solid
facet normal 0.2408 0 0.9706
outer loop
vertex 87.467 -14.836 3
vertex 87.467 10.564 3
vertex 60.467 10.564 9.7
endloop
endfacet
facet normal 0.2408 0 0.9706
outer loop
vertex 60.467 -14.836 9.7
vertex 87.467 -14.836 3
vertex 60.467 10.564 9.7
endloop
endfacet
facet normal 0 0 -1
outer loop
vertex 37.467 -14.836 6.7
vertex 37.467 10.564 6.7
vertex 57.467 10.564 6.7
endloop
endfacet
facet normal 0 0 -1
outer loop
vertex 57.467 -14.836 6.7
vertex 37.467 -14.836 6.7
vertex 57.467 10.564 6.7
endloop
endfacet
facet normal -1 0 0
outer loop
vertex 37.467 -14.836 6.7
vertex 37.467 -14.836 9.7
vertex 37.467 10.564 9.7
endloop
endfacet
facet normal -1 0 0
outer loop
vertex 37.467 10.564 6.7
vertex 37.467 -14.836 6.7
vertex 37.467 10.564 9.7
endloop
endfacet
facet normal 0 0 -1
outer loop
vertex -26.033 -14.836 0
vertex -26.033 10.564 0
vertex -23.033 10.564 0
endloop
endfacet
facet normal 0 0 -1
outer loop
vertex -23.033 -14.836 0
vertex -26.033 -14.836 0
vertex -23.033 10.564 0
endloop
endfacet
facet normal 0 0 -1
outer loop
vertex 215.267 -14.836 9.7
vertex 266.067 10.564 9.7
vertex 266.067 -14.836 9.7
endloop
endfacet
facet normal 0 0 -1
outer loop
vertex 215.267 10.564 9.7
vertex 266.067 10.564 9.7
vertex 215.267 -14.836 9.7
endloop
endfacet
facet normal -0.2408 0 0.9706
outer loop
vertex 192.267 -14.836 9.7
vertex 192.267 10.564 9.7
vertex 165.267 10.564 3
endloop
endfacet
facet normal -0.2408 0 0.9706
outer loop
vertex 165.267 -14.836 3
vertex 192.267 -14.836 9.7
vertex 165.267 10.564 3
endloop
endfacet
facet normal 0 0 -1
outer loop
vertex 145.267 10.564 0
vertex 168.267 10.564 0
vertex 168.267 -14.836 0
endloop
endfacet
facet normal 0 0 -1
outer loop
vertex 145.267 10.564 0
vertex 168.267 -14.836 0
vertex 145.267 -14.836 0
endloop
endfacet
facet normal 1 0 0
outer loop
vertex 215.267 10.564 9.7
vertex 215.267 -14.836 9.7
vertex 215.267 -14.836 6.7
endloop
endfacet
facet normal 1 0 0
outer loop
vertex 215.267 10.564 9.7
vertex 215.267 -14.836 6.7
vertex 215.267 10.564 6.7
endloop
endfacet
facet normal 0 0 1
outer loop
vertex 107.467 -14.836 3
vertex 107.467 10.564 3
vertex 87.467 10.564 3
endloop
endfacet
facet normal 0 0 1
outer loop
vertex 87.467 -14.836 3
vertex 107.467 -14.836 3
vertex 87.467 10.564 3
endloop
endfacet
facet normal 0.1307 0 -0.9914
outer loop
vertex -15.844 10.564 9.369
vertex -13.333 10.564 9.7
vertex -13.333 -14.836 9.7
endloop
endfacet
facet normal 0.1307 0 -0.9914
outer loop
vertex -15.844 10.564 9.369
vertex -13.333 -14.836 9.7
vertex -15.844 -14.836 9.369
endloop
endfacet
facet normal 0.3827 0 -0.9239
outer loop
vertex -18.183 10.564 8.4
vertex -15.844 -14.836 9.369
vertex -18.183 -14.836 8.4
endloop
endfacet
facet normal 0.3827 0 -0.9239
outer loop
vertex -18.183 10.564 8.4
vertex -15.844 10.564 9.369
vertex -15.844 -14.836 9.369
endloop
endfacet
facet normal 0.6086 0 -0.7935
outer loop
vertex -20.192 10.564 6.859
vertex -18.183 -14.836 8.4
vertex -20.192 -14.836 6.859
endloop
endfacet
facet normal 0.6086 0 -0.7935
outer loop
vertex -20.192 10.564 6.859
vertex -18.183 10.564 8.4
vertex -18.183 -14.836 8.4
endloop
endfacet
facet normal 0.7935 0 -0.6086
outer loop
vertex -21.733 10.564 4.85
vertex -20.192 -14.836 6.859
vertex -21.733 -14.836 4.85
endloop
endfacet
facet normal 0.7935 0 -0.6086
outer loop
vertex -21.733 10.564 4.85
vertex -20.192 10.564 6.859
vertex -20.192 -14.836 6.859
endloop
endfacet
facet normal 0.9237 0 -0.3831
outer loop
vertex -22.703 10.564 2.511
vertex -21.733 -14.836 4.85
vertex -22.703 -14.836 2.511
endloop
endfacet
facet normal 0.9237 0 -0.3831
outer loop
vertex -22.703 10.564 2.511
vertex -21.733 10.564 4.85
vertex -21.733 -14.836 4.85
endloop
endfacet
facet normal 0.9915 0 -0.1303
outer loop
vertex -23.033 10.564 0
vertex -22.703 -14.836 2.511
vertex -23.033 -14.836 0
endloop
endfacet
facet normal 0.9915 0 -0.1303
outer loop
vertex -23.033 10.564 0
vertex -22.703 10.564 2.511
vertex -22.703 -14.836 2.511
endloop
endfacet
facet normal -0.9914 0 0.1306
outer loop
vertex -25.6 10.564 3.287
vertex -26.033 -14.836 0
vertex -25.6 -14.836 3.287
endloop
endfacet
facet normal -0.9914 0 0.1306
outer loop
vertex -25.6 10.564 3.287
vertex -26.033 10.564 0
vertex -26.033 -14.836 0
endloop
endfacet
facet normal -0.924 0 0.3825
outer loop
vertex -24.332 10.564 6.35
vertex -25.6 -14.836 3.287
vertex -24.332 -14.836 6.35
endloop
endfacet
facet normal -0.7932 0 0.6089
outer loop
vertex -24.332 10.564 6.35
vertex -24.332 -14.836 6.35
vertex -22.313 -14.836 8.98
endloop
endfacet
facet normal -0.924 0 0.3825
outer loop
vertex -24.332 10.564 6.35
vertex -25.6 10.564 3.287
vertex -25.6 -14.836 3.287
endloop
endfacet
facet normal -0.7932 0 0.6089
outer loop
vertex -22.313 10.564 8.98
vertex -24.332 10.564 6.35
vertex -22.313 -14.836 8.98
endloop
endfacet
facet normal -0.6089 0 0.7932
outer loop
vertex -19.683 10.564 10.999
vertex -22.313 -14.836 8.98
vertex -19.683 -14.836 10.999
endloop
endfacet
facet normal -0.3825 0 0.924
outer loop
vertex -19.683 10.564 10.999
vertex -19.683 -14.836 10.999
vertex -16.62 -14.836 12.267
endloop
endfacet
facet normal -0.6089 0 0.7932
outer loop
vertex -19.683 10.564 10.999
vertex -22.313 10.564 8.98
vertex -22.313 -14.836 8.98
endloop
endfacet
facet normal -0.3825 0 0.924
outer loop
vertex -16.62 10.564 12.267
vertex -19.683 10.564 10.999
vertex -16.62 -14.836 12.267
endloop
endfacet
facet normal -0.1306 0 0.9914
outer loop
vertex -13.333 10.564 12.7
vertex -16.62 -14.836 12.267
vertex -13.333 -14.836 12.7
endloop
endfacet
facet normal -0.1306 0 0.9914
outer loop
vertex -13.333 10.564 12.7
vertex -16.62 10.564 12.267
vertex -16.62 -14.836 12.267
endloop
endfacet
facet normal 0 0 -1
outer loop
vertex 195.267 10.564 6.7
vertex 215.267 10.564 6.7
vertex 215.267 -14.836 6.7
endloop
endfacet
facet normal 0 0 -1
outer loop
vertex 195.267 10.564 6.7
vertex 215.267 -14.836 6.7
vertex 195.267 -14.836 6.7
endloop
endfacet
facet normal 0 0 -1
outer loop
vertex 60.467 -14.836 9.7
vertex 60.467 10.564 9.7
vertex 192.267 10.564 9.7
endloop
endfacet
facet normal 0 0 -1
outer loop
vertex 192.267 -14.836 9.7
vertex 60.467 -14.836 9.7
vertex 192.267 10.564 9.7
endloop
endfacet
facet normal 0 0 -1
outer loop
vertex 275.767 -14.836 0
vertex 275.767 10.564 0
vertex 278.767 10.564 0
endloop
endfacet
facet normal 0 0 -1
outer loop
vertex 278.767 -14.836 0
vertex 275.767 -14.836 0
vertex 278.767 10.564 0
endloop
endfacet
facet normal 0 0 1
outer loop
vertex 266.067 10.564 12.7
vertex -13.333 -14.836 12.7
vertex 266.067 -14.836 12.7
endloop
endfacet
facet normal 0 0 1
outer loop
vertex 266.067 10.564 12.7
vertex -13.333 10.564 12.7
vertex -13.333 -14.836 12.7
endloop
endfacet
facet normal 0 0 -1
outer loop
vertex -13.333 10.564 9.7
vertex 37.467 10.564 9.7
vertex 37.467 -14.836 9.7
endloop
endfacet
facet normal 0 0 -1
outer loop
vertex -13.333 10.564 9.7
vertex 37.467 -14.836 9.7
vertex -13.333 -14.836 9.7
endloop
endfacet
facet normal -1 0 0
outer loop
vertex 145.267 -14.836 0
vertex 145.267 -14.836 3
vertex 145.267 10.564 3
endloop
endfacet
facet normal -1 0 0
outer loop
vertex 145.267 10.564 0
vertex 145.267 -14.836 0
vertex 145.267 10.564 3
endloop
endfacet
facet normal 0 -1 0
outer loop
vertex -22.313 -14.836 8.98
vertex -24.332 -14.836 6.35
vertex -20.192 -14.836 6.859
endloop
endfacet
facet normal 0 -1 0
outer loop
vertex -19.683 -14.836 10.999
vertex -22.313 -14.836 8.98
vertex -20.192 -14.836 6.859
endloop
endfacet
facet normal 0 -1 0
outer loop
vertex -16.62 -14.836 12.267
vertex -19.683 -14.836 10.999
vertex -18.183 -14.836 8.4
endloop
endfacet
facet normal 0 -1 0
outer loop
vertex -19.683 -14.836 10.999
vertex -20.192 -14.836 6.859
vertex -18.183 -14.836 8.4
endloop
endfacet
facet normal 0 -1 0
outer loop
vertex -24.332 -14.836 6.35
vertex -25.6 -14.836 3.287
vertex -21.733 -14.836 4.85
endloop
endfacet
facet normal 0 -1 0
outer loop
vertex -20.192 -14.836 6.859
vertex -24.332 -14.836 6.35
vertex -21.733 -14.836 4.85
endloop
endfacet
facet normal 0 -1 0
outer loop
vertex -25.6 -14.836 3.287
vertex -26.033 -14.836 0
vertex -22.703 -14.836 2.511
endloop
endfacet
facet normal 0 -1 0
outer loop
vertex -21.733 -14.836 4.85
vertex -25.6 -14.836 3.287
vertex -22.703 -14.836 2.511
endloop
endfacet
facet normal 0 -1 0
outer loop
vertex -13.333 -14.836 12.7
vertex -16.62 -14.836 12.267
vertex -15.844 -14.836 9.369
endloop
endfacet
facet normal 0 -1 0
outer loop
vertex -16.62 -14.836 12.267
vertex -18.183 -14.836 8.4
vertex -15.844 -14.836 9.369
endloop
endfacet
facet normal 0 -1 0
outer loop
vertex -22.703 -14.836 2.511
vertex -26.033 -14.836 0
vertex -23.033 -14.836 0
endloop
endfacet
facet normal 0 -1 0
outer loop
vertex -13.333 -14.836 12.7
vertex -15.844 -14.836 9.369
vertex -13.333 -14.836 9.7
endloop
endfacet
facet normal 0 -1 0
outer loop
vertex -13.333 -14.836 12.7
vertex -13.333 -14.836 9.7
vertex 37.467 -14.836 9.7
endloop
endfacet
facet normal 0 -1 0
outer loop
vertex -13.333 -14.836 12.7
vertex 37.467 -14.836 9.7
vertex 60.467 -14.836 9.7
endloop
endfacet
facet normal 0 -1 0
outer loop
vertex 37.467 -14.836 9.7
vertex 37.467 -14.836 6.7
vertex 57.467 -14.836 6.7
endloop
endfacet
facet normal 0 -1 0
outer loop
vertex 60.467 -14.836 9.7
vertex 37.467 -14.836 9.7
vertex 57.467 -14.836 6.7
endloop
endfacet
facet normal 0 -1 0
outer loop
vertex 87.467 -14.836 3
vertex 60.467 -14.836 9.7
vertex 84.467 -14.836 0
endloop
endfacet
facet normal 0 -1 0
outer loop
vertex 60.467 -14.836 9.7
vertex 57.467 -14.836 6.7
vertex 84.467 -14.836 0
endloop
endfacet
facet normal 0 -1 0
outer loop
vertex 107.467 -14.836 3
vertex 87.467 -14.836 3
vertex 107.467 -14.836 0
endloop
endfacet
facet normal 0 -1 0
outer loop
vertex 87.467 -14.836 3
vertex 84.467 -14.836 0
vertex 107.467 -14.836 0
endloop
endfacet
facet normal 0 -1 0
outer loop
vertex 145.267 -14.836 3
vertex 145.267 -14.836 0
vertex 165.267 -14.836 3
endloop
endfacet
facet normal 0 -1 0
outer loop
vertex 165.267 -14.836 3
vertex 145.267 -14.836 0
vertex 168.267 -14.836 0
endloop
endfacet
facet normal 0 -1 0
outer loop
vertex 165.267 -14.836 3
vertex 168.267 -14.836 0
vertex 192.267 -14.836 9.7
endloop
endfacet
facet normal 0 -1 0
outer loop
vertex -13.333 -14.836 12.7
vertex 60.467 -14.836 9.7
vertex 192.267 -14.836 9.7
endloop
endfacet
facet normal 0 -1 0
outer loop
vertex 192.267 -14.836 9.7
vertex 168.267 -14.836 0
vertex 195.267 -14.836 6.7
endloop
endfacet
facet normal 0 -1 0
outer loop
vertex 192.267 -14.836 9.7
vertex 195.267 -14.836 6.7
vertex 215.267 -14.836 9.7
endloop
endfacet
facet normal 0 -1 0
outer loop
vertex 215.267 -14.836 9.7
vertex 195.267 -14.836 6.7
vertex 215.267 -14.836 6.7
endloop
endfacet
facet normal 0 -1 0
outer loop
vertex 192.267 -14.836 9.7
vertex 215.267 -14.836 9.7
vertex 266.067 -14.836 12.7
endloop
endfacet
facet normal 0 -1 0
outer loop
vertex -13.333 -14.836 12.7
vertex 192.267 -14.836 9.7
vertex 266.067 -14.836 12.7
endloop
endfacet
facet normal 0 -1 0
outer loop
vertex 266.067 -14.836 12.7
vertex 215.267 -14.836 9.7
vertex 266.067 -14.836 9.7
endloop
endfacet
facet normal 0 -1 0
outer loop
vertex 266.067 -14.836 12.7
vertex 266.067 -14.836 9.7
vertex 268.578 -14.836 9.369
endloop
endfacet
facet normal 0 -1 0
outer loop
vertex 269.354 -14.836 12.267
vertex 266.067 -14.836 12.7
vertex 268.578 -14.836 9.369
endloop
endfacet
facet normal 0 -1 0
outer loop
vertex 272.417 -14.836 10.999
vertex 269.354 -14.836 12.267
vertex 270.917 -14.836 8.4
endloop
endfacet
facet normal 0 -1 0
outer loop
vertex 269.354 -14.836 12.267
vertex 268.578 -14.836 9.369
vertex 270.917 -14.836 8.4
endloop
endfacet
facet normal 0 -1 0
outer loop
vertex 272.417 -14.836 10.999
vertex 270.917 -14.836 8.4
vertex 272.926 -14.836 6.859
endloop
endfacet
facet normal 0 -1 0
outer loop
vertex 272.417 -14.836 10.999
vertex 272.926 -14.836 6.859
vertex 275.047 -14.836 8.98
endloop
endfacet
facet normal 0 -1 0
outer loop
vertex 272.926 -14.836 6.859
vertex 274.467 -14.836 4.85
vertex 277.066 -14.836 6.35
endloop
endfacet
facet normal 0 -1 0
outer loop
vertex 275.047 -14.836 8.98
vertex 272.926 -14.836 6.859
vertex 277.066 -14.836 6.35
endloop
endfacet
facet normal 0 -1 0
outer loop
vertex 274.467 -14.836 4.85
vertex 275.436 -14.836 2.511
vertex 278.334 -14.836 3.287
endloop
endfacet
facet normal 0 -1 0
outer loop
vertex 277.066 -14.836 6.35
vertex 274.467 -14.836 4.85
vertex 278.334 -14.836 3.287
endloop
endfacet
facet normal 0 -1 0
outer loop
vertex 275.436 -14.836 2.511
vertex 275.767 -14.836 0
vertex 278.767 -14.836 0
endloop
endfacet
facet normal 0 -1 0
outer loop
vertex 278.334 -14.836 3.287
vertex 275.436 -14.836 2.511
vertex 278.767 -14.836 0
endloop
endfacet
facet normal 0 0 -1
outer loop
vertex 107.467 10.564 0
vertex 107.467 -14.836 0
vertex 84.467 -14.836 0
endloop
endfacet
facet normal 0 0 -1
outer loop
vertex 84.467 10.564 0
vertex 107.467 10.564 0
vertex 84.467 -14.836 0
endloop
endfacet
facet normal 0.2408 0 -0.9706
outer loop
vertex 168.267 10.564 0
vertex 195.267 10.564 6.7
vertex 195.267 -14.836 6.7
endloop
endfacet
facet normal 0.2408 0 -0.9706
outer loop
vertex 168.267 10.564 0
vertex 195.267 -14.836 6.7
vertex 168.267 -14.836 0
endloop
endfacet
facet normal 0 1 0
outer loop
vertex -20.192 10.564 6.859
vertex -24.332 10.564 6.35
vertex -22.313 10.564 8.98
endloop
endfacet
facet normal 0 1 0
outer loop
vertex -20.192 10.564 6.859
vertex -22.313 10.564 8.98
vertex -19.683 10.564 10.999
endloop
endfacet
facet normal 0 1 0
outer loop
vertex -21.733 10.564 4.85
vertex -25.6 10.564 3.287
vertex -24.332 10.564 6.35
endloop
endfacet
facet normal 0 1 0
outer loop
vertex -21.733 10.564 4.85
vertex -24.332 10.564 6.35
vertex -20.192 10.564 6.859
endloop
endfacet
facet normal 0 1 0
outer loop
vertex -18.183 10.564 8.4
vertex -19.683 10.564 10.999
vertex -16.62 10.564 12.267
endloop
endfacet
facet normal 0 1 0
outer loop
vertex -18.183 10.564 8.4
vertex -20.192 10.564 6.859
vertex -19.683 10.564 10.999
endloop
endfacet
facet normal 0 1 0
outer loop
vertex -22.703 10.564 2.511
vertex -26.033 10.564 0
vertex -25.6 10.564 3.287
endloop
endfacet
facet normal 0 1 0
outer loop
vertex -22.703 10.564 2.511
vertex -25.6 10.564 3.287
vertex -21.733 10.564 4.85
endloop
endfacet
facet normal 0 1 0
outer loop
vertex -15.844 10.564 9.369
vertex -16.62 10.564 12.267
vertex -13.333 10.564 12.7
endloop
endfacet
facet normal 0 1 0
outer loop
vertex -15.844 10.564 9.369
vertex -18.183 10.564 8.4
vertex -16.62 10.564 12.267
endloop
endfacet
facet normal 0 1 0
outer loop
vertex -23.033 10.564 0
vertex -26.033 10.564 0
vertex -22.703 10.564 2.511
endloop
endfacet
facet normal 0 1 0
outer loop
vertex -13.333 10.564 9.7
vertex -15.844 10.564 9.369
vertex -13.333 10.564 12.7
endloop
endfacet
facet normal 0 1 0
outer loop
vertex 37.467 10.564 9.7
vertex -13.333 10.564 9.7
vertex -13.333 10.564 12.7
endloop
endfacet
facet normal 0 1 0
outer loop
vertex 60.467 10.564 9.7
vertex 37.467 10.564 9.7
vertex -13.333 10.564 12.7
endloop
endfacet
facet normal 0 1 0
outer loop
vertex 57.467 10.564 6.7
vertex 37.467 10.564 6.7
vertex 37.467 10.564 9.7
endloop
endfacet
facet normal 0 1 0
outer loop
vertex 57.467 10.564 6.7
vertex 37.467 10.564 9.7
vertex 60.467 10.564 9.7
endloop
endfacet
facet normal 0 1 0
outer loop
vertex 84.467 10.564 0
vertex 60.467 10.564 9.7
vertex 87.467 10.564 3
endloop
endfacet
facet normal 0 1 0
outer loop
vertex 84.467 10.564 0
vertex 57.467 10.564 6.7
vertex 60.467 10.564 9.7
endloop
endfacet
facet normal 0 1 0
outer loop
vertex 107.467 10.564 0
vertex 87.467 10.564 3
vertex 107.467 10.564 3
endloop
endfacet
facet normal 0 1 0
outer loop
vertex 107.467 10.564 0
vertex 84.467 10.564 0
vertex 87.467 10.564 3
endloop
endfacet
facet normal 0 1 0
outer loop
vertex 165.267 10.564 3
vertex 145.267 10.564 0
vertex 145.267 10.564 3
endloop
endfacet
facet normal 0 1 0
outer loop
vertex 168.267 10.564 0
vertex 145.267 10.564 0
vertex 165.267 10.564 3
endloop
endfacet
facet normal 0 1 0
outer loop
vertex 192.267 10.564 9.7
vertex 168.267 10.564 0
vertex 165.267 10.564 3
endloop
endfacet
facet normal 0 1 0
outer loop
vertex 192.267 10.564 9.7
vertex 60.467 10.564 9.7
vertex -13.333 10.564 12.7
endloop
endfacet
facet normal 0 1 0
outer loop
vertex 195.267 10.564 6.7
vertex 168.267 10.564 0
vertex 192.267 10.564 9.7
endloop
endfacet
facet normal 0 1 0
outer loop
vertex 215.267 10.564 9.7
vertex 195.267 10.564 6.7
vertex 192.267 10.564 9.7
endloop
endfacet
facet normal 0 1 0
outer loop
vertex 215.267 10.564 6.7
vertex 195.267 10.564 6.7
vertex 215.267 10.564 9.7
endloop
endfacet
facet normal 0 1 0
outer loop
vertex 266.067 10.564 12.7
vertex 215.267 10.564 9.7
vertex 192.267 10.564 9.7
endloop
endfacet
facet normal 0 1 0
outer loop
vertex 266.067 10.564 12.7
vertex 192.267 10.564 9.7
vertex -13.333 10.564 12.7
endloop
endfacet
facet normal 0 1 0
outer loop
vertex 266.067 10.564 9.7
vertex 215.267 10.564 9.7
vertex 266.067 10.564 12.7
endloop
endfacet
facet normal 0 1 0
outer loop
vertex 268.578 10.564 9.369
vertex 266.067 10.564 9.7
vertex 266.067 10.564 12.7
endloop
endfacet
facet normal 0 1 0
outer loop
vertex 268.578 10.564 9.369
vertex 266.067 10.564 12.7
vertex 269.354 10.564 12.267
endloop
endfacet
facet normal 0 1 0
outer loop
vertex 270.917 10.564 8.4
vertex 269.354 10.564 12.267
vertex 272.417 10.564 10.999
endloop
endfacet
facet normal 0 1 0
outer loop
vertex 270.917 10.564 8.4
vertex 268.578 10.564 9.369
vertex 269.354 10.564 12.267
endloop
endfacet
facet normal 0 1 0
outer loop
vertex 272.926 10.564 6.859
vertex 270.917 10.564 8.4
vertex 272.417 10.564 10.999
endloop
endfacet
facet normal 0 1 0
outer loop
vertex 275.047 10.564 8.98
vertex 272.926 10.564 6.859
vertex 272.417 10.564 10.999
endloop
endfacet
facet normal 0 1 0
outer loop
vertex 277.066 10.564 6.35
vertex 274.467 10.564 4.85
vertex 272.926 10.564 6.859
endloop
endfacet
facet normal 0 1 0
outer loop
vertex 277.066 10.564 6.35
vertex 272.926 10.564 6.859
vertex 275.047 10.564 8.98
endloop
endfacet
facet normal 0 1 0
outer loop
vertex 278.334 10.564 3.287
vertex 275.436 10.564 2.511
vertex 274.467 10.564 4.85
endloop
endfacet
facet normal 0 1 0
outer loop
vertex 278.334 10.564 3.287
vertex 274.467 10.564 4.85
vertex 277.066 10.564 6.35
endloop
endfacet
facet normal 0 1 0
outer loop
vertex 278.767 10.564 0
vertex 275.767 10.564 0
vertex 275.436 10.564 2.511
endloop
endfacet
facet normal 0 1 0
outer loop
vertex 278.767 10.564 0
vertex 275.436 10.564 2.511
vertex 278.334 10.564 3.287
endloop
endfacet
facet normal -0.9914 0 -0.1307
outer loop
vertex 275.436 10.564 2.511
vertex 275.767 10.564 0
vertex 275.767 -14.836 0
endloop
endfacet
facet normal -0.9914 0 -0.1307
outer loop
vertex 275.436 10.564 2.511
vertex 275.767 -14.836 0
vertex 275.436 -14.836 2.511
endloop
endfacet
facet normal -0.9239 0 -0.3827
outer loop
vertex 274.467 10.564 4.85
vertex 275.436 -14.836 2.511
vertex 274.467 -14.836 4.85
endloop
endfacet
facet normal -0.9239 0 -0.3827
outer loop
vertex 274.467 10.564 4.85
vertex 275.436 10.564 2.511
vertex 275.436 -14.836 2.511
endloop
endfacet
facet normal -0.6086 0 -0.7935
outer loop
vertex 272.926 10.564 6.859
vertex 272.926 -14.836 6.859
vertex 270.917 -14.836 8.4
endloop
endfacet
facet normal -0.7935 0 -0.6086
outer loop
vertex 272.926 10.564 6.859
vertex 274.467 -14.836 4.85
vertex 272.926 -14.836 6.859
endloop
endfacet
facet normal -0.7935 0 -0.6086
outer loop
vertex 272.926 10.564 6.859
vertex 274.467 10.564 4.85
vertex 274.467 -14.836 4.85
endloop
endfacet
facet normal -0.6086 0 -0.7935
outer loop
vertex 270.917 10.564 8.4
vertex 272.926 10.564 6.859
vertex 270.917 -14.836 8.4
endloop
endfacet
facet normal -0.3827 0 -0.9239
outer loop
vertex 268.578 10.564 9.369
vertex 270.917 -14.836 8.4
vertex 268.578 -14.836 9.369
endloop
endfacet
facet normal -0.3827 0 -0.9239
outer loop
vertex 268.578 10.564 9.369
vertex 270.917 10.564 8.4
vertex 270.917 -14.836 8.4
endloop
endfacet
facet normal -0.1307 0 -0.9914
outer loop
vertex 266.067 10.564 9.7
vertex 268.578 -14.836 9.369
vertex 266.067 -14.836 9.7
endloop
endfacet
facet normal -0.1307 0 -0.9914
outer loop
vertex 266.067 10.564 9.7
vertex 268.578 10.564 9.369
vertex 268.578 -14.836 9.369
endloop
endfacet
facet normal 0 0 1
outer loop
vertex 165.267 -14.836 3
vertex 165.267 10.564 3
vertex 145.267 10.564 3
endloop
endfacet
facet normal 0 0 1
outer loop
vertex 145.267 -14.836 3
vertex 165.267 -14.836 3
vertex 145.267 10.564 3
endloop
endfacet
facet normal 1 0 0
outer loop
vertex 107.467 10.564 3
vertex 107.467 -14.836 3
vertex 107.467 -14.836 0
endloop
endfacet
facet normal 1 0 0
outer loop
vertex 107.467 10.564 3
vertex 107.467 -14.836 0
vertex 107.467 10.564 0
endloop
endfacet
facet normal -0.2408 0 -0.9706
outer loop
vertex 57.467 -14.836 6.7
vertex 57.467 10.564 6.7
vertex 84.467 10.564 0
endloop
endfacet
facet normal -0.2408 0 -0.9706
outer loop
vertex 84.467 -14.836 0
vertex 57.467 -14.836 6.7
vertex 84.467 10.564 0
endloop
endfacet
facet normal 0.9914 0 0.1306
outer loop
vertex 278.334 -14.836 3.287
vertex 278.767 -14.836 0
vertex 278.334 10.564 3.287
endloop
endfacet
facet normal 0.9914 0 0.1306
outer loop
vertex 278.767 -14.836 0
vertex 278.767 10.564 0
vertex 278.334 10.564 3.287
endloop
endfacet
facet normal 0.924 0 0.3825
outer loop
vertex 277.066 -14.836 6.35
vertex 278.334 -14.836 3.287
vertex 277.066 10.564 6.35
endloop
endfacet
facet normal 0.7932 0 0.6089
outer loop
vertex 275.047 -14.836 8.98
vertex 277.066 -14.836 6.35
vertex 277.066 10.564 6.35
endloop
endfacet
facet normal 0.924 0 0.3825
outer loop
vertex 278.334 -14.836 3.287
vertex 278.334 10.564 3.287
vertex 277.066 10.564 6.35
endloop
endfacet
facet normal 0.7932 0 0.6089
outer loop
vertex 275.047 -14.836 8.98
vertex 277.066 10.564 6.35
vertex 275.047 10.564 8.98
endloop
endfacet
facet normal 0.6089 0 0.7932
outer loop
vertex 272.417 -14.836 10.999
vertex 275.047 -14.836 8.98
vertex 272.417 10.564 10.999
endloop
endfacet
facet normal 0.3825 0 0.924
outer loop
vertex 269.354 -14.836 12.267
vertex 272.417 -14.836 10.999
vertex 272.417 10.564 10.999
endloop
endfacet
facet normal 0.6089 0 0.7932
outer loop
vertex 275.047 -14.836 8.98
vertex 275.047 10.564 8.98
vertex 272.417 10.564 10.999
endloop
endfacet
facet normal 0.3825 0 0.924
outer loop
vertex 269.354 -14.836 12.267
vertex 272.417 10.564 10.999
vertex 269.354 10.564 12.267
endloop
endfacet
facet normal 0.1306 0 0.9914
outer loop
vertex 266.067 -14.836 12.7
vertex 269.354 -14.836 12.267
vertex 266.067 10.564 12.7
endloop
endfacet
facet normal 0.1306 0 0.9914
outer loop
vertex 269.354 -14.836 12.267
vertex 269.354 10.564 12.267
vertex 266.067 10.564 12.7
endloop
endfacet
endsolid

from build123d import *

# Parameters (mm, degrees)
SKETCH1_W           = 304.8
SKETCH1_H           = 25.4
BOSS_EXTRUDE2_DEPTH = 12.7
FILLET1_R           = 12.7
CUT_EXTRUDE3_DEPTH  = 281.209703849
SKETCH8_W           = 70
SKETCH8_H           = 25.4
BOSS_EXTRUDE3_DEPTH = 9.7
CUT_EXTRUDE4_DEPTH  = 281.209703849
CUT_EXTRUDE5_DEPTH  = 281.209703849


with BuildPart() as part:
    # Sketch1 → Boss-Extrude2 (new body)
    with BuildSketch(Plane.XY):
        with Locations((126.366978193, -2.136448598)):
            Rectangle(SKETCH1_W, SKETCH1_H)
    extrude(amount=BOSS_EXTRUDE2_DEPTH)

    # Fillet1
    fillet1_edges = [part.edges().sort_by_distance(p)[0] for p in [
        (-26.033021807, -2.136448598, 12.7),
        (278.766978193, -2.136448598, 12.7),
    ]]
    fillet(fillet1_edges, radius=FILLET1_R - 0.0001)  # a hair under: the kernel refuses the full size

    # Sketch6 → Cut-Extrude3 (cut, through all)
    with BuildSketch(Plane(origin=(0, 10.563551402, 0), x_dir=(1, 0, 0), z_dir=(0, 1, 0))):
        with BuildLine():
            Line((-23.033021807, 0), (275.766978193, 0))
            ThreePointArc((275.766978193, 0), (272.925913971, -6.858935778), (266.066978193, -9.7))
            Line((266.066978193, -9.7), (-13.333021807, -9.7))
            ThreePointArc((-13.333021807, -9.7), (-20.191957584, -6.858935778), (-23.033021807, 0))
        make_face()
    extrude(amount=-CUT_EXTRUDE3_DEPTH, mode=Mode.SUBTRACT)

    # Sketch8 → Boss-Extrude3 (add)
    with BuildSketch(Plane(origin=(0, 0, 9.7), x_dir=(-1, 0, 0), z_dir=(0, 0, -1))):
        with Locations((-180.266978193, -2.136448598)):
            Rectangle(SKETCH8_W, SKETCH8_H)
        with Locations((-72.466978193, -2.136448598)):
            Rectangle(SKETCH8_W, SKETCH8_H)
    extrude(amount=BOSS_EXTRUDE3_DEPTH)

    # Sketch9 → Cut-Extrude4 (cut, through all)
    with BuildSketch(Plane(origin=(0, 10.563551402, 0), x_dir=(1, 0, 0), z_dir=(0, 1, 0))):
        Polygon((145.266978193, -9.7), (165.266978193, -9.7), (192.266978193, -9.7), (165.266978193, -3), (145.266978193, -3), align=None)
        Polygon((215.266978193, -6.7), (195.266978193, -6.7), (168.266978193, 0), (215.266978193, 0), align=None)
    extrude(amount=-CUT_EXTRUDE4_DEPTH, mode=Mode.SUBTRACT)

    # Sketch12 → Cut-Extrude5 (cut, through all)
    with BuildSketch(Plane(origin=(0, 10.563551402, 0), x_dir=(1, 0, 0), z_dir=(0, 1, 0))):
        Polygon((107.466978193, -9.7), (107.466978193, -3), (87.466978193, -3), (60.466978193, -9.7), align=None)
        Polygon((37.466978193, -6.7), (57.466978193, -6.7), (84.466978193, 0), (37.466978193, 0), align=None)
    extrude(amount=-CUT_EXTRUDE5_DEPTH, mode=Mode.SUBTRACT)


solid = part.part
